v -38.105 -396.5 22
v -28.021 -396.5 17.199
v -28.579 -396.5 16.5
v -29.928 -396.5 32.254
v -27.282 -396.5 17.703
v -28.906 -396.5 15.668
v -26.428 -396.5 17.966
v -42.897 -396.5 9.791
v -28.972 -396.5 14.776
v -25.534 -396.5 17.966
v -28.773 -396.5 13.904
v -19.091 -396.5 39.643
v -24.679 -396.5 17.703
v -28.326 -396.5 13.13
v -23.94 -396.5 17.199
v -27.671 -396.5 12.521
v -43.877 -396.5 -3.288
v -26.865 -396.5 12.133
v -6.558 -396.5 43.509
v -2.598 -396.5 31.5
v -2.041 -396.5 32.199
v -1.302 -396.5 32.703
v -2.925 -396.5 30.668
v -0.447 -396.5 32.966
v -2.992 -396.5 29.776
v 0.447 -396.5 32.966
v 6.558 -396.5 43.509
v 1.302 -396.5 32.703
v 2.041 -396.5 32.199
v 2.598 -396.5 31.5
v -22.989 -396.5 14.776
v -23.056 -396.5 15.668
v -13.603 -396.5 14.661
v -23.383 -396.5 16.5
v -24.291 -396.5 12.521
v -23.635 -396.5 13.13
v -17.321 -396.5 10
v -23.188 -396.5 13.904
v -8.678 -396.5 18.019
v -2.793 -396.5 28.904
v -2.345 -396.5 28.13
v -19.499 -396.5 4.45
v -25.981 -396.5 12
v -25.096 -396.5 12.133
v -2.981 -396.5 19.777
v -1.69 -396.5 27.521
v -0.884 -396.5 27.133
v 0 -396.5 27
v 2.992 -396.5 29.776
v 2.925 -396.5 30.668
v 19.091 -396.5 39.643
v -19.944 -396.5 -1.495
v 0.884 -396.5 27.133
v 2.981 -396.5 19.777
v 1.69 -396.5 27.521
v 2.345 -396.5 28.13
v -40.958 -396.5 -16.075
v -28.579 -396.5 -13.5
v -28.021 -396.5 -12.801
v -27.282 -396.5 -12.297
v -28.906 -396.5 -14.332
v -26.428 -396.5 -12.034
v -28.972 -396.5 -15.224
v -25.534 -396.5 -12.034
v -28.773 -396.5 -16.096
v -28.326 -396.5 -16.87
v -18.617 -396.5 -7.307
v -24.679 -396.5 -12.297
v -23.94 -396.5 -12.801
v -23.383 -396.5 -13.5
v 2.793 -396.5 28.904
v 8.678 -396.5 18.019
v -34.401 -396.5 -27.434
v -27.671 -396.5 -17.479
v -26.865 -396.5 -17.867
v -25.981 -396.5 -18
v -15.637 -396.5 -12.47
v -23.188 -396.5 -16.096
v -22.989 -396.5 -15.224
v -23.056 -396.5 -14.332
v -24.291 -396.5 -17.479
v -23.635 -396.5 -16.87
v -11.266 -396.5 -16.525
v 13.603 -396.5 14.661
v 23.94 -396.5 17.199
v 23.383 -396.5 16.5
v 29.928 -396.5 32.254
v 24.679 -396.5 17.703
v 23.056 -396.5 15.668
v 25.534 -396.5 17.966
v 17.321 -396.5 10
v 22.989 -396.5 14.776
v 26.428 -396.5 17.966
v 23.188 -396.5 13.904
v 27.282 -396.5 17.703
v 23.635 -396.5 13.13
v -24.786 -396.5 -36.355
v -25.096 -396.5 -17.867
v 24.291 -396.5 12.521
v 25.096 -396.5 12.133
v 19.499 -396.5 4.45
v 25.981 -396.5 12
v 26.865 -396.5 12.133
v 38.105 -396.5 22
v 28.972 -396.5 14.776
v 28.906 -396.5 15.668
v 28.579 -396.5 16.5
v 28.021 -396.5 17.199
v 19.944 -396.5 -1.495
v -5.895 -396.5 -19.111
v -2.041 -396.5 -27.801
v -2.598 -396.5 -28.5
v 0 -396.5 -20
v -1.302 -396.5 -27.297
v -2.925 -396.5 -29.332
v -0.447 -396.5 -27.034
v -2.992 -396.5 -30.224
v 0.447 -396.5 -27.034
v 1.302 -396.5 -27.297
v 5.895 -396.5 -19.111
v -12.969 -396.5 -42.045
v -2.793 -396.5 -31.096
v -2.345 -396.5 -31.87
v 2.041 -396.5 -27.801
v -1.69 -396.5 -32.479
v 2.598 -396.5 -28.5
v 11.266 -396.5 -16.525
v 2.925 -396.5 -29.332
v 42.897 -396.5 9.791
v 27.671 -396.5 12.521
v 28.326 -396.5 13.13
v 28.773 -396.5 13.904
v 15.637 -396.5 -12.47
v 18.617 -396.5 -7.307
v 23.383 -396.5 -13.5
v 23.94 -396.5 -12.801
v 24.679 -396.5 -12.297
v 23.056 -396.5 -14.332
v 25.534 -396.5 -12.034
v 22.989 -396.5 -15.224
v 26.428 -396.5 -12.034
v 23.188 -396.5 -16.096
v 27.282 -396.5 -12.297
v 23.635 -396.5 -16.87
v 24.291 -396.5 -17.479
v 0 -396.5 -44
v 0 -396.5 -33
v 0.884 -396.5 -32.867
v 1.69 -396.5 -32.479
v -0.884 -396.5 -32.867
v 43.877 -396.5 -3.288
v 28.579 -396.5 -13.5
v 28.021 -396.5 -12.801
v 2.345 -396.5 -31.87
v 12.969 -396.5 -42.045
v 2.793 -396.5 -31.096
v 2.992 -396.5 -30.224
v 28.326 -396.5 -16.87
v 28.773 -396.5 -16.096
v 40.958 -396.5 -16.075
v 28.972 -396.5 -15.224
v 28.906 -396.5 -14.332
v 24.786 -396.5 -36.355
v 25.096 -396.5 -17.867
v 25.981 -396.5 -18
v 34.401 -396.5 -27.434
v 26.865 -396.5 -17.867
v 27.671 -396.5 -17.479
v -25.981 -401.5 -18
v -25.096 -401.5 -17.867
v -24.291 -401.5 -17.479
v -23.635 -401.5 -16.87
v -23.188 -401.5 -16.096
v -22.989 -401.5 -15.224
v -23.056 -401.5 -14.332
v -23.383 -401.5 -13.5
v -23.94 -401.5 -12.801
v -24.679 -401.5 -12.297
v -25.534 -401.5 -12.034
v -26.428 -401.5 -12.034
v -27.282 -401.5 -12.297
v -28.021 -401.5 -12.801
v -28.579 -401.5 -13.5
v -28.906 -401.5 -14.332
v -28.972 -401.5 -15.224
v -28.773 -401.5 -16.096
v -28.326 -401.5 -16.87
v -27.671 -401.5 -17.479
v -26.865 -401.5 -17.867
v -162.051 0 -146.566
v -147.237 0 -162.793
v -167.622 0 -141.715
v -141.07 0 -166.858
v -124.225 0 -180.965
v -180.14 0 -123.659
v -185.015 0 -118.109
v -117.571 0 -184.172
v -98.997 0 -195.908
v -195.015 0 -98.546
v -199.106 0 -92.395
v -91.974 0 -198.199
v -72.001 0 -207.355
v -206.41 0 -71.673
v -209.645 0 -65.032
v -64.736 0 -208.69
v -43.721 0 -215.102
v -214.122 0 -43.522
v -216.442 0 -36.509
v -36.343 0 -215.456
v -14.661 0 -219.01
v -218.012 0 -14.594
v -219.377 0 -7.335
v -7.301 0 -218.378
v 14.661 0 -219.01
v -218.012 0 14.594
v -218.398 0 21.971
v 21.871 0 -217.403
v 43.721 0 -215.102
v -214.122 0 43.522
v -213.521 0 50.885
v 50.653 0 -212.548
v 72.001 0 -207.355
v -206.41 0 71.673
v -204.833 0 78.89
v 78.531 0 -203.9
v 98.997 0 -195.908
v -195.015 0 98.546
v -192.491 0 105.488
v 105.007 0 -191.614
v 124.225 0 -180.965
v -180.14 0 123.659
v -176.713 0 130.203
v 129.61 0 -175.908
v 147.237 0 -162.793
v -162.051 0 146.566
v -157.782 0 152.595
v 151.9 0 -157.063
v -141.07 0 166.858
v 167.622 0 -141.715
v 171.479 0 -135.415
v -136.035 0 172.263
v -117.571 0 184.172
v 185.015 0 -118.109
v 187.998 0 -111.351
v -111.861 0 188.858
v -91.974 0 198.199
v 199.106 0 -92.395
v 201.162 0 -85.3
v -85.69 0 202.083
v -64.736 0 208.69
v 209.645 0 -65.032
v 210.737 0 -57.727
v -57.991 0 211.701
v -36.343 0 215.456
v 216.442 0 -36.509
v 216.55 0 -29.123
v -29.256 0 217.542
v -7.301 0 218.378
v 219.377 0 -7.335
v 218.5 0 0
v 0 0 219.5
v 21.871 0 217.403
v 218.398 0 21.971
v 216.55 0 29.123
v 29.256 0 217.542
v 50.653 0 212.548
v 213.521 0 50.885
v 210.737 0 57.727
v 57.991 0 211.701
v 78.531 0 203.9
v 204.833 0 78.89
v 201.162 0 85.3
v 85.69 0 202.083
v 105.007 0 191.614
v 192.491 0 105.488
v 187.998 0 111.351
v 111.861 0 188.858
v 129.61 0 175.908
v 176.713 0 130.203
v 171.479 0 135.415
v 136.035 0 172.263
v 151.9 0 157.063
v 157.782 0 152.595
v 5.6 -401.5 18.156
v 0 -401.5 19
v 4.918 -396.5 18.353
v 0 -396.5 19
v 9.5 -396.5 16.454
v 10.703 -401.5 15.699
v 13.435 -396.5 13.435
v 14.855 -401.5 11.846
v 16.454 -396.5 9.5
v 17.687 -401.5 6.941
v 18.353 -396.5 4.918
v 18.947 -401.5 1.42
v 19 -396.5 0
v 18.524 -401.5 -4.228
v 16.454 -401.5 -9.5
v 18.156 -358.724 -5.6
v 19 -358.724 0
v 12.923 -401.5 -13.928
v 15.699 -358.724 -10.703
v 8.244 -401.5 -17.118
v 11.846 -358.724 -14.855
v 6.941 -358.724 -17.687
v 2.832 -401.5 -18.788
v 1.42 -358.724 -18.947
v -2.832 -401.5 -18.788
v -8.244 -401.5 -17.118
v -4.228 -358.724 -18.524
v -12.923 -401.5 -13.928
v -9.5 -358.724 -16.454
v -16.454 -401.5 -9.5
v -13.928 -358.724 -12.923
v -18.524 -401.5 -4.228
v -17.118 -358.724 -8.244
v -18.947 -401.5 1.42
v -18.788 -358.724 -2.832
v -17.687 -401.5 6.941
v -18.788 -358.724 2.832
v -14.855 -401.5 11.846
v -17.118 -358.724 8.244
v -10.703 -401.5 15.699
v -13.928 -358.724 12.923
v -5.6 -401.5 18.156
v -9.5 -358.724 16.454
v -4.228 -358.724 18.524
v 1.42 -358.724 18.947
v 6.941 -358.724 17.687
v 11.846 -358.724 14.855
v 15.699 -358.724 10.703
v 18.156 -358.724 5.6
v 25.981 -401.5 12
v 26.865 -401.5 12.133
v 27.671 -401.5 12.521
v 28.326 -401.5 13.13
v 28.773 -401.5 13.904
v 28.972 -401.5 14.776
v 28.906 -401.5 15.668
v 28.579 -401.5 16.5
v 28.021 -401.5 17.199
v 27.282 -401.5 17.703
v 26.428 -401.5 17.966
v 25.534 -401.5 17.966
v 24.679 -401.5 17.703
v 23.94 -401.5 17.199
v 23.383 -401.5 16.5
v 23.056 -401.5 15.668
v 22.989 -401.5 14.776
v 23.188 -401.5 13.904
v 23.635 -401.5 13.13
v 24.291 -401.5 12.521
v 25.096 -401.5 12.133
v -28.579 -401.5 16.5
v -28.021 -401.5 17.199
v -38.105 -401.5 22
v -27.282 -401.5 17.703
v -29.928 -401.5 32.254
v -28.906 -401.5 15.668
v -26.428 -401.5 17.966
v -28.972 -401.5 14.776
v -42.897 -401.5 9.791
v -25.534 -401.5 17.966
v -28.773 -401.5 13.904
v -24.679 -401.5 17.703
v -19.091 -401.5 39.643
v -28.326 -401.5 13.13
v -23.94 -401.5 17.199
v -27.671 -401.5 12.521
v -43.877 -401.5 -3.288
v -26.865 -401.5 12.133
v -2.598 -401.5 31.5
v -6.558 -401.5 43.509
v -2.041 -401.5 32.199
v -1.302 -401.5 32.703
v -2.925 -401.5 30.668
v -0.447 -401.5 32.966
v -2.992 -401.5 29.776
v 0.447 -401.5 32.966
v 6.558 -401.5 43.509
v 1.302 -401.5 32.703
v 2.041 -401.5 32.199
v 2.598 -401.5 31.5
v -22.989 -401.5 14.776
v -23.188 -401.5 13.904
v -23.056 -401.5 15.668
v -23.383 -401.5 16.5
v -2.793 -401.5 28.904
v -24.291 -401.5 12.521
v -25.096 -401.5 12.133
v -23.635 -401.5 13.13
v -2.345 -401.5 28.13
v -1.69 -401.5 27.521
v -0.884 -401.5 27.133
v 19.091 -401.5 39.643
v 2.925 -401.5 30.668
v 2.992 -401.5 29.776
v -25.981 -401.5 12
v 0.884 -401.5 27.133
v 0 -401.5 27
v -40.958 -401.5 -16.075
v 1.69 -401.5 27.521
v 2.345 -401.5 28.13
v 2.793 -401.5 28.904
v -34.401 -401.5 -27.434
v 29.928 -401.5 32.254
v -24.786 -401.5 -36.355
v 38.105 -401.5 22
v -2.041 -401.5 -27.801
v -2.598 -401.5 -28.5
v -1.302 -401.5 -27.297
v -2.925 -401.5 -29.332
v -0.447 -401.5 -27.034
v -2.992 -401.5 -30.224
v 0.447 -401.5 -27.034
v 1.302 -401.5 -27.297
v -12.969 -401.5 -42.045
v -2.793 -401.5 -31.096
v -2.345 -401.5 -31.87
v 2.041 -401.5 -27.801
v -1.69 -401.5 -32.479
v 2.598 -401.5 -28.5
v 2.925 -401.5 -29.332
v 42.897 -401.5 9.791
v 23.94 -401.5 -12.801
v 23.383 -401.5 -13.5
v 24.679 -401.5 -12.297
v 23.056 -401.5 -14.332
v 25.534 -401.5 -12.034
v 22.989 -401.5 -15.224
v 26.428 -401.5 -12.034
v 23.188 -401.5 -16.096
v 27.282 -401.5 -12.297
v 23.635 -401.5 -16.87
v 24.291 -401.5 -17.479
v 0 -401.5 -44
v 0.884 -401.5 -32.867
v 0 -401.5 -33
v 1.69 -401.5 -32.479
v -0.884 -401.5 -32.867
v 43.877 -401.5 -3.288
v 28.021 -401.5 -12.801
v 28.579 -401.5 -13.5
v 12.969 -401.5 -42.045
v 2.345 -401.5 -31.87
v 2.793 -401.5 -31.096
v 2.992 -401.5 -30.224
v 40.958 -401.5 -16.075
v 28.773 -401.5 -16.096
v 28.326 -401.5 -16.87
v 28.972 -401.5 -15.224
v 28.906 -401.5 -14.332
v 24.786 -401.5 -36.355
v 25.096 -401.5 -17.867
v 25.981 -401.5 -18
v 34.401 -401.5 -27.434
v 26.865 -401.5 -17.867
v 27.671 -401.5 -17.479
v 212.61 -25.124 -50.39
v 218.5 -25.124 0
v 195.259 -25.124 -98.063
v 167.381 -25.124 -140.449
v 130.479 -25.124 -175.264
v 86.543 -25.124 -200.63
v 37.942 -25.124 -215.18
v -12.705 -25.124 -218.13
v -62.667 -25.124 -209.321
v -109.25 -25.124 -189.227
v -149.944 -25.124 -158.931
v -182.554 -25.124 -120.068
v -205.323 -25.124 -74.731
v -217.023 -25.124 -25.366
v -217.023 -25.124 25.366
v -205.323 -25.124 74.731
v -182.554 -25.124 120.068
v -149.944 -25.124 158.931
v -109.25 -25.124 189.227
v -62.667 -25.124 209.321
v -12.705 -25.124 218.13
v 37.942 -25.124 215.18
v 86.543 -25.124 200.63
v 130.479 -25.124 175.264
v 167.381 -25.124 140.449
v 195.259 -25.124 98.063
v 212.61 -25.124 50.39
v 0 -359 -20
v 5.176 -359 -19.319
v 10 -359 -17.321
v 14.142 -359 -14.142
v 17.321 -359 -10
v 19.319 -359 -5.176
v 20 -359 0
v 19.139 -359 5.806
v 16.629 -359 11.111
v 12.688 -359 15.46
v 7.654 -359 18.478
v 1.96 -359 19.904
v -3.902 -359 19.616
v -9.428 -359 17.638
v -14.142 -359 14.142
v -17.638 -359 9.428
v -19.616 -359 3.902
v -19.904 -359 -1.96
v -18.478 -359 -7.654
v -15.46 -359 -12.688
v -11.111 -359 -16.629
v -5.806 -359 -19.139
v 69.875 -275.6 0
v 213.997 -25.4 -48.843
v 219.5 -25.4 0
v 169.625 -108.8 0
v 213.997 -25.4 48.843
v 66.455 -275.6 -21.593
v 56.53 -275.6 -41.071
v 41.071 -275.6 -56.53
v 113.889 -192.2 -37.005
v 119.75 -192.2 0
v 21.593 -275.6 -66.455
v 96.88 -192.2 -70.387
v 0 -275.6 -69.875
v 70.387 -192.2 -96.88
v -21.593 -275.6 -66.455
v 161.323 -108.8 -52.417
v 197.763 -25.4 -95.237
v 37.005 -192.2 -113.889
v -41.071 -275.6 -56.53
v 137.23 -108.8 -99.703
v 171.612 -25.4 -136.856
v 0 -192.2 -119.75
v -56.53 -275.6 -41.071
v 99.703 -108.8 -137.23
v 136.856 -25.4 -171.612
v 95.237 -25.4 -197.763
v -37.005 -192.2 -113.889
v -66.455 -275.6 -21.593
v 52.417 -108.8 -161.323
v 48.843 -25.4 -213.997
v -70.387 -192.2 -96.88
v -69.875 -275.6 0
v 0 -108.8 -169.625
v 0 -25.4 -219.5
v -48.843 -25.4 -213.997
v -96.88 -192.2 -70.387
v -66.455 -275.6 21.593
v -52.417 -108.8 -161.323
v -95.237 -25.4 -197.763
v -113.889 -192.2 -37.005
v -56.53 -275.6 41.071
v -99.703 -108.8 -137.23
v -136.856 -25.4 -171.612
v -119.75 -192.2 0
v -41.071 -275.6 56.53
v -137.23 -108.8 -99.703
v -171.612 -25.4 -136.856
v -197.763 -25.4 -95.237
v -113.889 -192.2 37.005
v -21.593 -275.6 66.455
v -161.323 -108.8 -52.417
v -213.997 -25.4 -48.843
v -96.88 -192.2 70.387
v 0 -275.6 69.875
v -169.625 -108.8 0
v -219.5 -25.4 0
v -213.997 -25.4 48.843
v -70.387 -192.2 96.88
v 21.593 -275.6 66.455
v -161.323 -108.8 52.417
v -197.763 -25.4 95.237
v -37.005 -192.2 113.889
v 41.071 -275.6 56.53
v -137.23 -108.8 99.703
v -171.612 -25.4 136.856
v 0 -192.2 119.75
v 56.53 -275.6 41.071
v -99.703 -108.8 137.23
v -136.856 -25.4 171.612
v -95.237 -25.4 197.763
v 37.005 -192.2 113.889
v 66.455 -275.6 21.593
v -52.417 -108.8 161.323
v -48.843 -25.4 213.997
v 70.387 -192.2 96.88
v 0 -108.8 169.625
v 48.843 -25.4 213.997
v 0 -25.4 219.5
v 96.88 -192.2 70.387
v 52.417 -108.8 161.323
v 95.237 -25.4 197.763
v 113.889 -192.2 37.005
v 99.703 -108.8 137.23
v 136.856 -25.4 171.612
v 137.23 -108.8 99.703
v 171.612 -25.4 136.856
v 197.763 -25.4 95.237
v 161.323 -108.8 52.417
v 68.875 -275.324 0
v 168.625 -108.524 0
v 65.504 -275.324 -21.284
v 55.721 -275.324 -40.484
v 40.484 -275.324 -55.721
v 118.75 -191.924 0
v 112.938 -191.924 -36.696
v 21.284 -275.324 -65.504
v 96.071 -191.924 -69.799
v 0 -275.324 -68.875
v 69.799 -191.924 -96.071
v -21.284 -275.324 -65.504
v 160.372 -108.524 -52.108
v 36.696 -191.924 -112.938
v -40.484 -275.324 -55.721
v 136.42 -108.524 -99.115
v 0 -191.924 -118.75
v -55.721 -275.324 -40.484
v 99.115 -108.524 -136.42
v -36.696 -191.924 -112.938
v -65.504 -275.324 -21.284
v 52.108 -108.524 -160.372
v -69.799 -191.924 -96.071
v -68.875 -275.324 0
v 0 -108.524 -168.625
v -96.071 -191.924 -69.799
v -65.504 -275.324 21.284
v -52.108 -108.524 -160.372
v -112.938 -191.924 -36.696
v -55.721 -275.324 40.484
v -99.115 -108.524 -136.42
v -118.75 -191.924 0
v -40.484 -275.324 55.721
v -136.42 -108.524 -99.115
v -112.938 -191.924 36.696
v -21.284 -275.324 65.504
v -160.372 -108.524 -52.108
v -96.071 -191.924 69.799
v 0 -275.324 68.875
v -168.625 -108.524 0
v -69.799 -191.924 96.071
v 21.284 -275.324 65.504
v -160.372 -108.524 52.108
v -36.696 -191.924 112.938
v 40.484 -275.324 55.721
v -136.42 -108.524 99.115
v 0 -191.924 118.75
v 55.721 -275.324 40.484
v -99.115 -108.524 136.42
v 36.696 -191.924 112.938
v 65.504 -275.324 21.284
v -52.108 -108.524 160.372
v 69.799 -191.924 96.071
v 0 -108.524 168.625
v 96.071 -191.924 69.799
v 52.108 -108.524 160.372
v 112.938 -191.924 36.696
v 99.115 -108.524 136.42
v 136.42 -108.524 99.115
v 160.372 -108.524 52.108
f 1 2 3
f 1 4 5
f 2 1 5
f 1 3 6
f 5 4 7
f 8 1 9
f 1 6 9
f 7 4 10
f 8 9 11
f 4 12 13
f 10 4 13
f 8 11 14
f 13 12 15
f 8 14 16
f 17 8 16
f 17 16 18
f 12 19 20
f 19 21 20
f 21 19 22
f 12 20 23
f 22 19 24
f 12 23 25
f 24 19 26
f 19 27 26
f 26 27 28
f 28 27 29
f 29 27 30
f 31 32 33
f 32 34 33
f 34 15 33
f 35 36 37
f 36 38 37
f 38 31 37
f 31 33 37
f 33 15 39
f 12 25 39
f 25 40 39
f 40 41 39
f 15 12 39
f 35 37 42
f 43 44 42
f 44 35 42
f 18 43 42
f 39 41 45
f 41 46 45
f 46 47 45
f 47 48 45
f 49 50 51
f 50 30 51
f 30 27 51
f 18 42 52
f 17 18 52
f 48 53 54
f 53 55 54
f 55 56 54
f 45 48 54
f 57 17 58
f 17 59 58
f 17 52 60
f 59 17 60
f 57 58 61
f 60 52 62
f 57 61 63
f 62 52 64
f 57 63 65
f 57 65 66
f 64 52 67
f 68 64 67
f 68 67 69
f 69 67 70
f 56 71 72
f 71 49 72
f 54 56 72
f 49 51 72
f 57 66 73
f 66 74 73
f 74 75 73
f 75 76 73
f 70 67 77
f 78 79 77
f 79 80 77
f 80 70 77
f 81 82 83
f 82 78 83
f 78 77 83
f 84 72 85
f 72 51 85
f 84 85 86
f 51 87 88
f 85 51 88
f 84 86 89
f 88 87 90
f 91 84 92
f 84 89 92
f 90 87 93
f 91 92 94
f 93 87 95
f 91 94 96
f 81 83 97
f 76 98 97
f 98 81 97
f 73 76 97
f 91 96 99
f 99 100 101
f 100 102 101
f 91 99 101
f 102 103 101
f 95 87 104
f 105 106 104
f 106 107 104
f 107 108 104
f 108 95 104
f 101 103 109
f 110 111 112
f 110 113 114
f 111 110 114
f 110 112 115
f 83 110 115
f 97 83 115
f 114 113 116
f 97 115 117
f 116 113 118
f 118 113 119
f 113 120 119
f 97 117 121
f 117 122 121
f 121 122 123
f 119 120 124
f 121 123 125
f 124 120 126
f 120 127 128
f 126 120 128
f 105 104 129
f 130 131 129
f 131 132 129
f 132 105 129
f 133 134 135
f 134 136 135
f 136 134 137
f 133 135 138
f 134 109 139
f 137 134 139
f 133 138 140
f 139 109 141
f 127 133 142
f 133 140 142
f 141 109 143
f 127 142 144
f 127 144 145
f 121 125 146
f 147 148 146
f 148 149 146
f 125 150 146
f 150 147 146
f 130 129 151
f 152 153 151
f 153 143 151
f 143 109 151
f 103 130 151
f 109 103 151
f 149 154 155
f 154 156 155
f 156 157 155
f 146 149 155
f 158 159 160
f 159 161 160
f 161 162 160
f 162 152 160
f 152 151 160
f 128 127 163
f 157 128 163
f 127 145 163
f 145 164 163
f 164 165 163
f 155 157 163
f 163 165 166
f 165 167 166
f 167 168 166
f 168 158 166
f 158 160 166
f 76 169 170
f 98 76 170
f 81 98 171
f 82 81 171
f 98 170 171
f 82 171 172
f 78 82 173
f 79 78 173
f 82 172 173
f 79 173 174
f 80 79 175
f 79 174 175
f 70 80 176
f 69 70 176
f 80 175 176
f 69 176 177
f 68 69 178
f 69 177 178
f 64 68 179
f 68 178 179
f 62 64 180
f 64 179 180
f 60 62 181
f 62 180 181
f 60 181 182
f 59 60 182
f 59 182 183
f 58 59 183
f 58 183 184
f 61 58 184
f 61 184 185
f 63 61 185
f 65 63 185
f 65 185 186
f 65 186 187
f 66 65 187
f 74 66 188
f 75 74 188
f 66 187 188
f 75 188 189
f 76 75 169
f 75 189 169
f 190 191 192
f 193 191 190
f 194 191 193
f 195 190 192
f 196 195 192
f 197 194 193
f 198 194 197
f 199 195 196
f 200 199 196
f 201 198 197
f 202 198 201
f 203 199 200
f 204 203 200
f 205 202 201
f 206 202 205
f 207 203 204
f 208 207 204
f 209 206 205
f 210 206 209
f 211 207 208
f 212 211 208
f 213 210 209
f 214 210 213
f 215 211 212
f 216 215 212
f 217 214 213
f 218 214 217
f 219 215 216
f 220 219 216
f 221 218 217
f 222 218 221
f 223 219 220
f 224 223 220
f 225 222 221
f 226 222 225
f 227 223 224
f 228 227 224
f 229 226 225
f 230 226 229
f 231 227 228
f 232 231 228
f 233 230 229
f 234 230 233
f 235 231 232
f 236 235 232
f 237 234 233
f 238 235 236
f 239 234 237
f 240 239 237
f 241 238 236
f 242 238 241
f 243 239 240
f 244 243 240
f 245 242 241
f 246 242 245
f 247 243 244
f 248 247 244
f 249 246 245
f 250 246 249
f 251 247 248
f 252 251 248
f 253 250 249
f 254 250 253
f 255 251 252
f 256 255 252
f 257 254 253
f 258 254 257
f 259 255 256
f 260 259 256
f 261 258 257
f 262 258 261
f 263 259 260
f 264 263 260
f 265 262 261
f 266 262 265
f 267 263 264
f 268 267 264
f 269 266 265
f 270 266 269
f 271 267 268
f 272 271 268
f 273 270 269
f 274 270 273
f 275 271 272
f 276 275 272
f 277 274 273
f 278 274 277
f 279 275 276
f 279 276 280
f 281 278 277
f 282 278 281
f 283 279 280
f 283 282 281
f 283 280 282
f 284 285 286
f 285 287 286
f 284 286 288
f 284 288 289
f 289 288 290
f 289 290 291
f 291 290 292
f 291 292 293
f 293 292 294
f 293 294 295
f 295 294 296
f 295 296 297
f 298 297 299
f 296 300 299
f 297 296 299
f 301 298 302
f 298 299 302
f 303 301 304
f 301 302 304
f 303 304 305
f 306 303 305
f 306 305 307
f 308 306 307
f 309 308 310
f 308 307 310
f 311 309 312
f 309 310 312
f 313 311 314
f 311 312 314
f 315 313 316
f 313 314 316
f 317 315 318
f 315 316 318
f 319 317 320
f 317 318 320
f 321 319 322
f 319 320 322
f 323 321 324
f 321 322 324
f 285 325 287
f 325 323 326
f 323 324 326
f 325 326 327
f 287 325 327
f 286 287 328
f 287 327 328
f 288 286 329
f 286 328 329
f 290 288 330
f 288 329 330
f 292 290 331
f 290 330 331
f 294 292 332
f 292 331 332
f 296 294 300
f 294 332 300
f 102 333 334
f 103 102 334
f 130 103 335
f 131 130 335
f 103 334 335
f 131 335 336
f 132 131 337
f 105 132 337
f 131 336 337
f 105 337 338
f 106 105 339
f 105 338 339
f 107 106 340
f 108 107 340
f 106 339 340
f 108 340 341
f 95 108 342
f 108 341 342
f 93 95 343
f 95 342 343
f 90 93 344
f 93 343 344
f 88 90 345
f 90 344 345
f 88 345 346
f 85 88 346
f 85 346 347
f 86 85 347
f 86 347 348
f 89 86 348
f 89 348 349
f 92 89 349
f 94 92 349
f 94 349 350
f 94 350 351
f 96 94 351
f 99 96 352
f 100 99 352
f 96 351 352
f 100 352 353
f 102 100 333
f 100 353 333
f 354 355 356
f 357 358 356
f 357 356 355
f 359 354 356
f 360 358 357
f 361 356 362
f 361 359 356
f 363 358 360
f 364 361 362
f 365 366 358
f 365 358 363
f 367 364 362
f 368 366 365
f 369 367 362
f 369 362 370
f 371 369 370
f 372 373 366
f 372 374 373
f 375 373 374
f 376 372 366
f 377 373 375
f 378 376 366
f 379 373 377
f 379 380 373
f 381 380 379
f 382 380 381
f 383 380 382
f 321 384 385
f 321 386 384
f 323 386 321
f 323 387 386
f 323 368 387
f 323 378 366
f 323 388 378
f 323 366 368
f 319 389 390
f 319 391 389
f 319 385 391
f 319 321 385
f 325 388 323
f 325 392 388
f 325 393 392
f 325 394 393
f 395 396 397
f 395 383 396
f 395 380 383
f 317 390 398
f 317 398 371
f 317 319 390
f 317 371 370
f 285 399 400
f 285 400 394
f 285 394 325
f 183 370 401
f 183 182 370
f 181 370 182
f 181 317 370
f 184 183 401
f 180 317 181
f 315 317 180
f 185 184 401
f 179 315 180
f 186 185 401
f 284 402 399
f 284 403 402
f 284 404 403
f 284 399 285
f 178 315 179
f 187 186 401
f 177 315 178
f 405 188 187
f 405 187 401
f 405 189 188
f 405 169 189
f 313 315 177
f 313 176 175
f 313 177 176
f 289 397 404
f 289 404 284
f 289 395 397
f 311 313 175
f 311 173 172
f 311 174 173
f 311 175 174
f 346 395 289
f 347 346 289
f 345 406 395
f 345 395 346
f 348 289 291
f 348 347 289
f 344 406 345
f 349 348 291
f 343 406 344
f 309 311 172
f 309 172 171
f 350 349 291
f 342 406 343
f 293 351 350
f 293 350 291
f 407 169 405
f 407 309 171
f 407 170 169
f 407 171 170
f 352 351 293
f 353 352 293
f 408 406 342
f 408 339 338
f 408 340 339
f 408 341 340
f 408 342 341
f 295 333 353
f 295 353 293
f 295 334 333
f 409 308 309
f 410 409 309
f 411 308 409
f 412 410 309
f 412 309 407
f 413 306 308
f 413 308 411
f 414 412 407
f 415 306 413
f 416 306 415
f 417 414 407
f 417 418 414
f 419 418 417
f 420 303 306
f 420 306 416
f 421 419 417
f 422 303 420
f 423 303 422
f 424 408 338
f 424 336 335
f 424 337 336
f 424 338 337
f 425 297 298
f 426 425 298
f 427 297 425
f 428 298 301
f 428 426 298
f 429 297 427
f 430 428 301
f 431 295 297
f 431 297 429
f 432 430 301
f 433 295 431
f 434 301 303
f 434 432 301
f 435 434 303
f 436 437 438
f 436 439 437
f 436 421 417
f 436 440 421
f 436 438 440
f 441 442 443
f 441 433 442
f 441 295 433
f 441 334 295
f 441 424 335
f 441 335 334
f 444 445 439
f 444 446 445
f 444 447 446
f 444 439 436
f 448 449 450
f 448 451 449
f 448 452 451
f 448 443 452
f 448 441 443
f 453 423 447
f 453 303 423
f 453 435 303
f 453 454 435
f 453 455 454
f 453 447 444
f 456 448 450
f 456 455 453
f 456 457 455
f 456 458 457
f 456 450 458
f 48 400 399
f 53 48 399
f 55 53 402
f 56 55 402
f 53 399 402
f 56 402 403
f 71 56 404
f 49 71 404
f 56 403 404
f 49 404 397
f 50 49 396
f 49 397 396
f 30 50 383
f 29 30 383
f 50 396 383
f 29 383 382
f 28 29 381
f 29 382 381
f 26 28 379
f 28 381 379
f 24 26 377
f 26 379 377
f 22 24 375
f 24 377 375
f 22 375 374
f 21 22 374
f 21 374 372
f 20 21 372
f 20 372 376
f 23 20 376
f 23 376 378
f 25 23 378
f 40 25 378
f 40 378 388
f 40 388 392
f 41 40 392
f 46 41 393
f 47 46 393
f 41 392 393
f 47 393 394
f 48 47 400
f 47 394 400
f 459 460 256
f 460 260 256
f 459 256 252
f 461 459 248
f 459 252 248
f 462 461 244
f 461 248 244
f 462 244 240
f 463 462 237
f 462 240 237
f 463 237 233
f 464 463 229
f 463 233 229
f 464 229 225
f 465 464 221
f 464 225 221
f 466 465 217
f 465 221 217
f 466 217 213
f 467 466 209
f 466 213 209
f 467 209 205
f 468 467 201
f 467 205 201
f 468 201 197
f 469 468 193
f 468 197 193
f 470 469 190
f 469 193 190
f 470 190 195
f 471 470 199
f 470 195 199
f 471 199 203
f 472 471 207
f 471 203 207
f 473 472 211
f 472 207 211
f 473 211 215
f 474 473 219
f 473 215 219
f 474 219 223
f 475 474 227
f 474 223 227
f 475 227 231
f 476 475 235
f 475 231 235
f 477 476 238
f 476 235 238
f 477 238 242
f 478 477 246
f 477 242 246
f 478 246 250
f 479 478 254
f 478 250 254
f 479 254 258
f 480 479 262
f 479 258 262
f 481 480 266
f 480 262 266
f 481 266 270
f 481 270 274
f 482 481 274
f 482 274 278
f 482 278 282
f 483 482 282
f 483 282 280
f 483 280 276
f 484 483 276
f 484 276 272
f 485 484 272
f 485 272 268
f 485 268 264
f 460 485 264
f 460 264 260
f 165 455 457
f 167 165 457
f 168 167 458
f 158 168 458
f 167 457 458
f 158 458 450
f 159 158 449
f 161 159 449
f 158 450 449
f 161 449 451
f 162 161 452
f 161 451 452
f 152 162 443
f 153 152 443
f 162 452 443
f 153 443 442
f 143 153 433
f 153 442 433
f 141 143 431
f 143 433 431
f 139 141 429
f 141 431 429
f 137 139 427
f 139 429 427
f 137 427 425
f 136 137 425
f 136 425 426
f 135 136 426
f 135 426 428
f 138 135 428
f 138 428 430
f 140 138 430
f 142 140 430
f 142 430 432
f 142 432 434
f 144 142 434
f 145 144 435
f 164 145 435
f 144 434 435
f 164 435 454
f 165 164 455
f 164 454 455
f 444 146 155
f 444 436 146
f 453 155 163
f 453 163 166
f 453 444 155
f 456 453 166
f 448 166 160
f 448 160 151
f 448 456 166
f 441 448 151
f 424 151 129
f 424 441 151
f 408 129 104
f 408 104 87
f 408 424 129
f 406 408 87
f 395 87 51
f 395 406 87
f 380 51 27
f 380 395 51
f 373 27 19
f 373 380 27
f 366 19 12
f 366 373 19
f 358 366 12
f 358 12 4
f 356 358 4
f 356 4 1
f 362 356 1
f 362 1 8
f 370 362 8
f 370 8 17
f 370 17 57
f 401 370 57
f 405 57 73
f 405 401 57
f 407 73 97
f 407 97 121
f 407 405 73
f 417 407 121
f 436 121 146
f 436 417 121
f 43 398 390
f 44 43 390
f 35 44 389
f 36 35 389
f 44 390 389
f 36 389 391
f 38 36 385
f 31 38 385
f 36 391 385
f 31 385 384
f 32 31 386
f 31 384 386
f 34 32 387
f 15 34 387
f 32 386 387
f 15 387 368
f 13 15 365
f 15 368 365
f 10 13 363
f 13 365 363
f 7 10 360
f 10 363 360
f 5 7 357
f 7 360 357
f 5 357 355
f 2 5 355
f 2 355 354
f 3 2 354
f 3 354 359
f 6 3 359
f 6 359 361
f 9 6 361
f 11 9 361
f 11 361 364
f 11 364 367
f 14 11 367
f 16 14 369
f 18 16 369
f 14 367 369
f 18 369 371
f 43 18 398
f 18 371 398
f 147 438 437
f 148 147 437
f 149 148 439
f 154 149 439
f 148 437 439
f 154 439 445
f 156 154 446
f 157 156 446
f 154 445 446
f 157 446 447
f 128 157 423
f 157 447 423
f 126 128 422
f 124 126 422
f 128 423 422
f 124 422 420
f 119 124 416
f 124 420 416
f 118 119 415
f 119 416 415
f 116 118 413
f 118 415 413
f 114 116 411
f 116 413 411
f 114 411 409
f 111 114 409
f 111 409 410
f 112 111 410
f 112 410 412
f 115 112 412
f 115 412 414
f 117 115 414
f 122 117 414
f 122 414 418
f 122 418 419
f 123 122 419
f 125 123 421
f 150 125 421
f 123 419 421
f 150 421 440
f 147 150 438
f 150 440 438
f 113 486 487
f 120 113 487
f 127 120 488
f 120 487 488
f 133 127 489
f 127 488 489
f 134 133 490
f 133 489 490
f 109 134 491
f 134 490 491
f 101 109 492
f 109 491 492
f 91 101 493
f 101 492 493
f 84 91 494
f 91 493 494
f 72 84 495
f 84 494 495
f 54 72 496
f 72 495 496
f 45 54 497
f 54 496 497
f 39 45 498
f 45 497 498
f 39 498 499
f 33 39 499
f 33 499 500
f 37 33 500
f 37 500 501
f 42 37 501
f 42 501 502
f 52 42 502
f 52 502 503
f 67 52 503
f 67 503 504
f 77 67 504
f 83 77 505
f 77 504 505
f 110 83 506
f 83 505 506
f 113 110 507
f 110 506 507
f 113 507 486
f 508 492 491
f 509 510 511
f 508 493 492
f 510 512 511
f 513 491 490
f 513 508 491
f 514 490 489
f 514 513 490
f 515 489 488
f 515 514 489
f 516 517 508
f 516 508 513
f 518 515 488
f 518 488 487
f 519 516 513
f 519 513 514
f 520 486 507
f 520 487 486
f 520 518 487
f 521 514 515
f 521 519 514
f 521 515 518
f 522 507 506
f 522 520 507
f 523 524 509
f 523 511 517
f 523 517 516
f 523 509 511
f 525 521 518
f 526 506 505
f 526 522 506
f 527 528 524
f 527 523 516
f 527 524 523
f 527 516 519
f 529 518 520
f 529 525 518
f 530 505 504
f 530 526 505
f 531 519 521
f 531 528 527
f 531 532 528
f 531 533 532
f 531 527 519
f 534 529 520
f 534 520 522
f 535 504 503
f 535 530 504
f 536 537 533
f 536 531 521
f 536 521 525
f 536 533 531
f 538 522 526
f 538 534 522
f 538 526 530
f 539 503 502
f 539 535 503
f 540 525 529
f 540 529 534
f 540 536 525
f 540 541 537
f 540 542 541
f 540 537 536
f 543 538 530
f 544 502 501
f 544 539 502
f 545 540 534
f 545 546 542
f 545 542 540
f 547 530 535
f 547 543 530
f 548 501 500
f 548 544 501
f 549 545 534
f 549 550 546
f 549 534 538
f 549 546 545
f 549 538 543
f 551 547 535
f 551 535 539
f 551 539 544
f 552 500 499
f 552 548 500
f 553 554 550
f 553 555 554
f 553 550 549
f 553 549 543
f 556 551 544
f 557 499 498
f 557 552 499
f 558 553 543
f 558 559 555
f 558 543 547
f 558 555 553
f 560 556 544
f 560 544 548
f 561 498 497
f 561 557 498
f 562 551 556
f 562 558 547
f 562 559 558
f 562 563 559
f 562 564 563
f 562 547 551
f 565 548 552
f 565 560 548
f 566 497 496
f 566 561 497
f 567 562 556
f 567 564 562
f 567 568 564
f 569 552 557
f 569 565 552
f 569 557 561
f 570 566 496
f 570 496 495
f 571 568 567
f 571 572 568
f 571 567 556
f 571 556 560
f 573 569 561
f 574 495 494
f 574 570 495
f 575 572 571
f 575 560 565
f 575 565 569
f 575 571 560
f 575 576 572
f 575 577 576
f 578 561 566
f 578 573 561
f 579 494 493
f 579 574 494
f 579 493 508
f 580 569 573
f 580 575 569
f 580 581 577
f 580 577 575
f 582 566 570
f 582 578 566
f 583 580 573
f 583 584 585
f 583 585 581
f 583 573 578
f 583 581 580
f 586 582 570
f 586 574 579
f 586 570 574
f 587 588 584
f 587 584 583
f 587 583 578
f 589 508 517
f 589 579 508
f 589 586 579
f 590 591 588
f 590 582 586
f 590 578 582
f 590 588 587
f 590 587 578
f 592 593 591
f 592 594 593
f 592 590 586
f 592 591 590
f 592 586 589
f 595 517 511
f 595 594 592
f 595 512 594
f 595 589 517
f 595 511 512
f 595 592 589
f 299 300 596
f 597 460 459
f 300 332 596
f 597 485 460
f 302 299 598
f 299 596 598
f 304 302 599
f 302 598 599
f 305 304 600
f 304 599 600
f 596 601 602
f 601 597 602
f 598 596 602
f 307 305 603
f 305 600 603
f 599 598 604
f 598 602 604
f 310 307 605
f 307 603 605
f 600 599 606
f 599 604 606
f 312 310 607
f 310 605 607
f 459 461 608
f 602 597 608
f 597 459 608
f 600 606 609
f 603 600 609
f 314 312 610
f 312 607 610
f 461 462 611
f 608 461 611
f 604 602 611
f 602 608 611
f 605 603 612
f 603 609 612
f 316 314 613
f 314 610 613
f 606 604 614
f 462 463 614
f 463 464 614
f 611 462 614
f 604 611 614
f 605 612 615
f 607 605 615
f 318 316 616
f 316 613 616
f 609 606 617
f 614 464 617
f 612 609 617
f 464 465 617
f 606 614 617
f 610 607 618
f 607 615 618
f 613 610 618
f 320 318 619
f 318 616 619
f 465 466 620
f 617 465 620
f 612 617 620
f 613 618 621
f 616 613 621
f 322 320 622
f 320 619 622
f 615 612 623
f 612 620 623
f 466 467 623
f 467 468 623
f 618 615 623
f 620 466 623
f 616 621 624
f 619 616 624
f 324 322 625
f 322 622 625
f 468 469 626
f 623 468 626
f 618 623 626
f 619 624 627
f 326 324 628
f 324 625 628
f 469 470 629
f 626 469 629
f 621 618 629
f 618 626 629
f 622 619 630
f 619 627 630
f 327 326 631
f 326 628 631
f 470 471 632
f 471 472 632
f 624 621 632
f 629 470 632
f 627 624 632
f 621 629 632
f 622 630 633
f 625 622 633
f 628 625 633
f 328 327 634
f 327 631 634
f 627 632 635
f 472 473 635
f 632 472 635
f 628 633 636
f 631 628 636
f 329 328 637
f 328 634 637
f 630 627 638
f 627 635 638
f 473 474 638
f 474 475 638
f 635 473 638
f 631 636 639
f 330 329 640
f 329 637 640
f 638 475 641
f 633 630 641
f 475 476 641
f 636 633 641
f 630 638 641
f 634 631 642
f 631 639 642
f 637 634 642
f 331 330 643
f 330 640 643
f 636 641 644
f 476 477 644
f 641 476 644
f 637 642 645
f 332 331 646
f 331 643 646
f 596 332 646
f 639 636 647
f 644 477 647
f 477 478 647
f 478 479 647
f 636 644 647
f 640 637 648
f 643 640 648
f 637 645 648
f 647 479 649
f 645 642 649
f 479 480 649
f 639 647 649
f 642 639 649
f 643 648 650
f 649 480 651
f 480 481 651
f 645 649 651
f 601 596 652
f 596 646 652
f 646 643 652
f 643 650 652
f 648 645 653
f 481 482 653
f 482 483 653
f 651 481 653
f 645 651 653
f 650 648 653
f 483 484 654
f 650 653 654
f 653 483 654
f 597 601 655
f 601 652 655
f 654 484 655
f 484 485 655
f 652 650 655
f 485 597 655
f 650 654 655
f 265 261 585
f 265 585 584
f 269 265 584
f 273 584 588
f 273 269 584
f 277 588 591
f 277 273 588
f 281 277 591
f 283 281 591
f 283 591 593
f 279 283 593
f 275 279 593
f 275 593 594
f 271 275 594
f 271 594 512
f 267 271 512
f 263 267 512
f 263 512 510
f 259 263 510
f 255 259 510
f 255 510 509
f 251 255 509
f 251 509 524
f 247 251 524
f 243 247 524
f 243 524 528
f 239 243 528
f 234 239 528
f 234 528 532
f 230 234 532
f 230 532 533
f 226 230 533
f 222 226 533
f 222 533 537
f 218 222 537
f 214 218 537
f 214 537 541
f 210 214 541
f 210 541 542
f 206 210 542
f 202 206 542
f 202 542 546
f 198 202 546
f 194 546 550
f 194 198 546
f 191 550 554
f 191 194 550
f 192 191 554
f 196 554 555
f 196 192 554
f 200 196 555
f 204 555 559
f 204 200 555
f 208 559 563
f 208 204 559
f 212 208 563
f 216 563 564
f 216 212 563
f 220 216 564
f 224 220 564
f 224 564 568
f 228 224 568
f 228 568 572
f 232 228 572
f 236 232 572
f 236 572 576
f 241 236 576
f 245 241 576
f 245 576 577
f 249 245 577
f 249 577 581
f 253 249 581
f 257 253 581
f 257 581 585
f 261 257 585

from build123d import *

# Parameters (mm, degrees)
CROQUIS1_R              = 219.5
SALIENTE_EXTRUIR1_DEPTH = 25.4
CROQUIS3_R              = 20
CROQUIS2_R              = 219.5
CROQUIS4_R              = 20
SALIENTE_EXTRUIR2_DEPTH = 40
CROQUIS10_R             = 44
SALIENTE_EXTRUIR6_DEPTH = 2.5
CROQUIS15_R             = 19
CORTAR_EXTRUIR1_DEPTH   = 504.560075947
CROQUIS16_R             = 3
CORTAR_EXTRUIR2_DEPTH   = 5


# Read off the part's stored shape, not the designer's step: Vaciado3
with BuildPart() as part:
    # Croquis1 → Saliente-Extruir1 (new body)
    with BuildSketch(Plane(origin=(0, 0, 0), x_dir=(1, 0, 0), z_dir=(0, 1, 0))):
        with Locations(Location((0, 0, 0), (0, 0, 270))):
            Circle(CROQUIS1_R)
    extrude(amount=-SALIENTE_EXTRUIR1_DEPTH)

    # Croquis3 → Recubrir1 section 0
    with BuildSketch(Plane(origin=(0, -359, 0), x_dir=(1, 0, 0), z_dir=(0, 1, 0))):
        Circle(CROQUIS3_R)
    # Croquis2 → Recubrir1 section 1
    with BuildSketch(Plane.XZ.offset(25.4)):
        Circle(CROQUIS2_R)
    loft()

    # Croquis4 → Saliente-Extruir2 (add)
    with BuildSketch(Plane.XZ.offset(359)):
        with Locations(Location((0, 0, 0), (0, 0, 270))):
            Circle(CROQUIS4_R)
    extrude(amount=SALIENTE_EXTRUIR2_DEPTH)

    # Vaciado3 outline → Vaciado3 (revolve, cut)
    with BuildSketch(Plane.XY):
        Polygon((218.5, -25.123799723), (218.5, 0), (0, 0), (0, -399), (19, -399), (19, -358.723799723), align=None)
    revolve(axis=Axis((0, 0, 0), (0, 1, 0)), mode=Mode.SUBTRACT)

    # Croquis10 → Saliente-Extruir6 (add, symmetric)
    with BuildSketch(Plane.XZ.offset(399)):
        with Locations(Location((0, 0, 0), (0, 0, 270))):
            Circle(CROQUIS10_R)
    extrude(amount=SALIENTE_EXTRUIR6_DEPTH, both=True)

    # Croquis15 → Cortar-Extruir1 (cut, through all)
    with BuildSketch(Plane(origin=(0, -396.5, 0), x_dir=(1, 0, 0), z_dir=(0, 1, 0))):
        with Locations(Location((0, 0, 0), (0, 0, 270))):
            Circle(CROQUIS15_R)
    extrude(amount=-CORTAR_EXTRUIR1_DEPTH, mode=Mode.SUBTRACT)

    # Croquis16 → Cortar-Extruir2 (cut)
    with BuildSketch(Plane.XZ.offset(401.5)):
        with Locations(Location((0, -30, 0), (0, 0, 270))):
            Circle(CROQUIS16_R)
        with Locations(Location((-25.980762114, -15, 0), (0, 0, 270))):
            Circle(CROQUIS16_R)
        with Locations(Location((-25.980762114, 15, 0), (0, 0, 270))):
            Circle(CROQUIS16_R)
        with Locations(Location((0, 30, 0), (0, 0, 270))):
            Circle(CROQUIS16_R)
        with Locations(Location((25.980762114, 15, 0), (0, 0, 270))):
            Circle(CROQUIS16_R)
        with Locations(Location((25.980762114, -15, 0), (0, 0, 270))):
            Circle(CROQUIS16_R)
    extrude(amount=-CORTAR_EXTRUIR2_DEPTH, mode=Mode.SUBTRACT)


solid = part.part
